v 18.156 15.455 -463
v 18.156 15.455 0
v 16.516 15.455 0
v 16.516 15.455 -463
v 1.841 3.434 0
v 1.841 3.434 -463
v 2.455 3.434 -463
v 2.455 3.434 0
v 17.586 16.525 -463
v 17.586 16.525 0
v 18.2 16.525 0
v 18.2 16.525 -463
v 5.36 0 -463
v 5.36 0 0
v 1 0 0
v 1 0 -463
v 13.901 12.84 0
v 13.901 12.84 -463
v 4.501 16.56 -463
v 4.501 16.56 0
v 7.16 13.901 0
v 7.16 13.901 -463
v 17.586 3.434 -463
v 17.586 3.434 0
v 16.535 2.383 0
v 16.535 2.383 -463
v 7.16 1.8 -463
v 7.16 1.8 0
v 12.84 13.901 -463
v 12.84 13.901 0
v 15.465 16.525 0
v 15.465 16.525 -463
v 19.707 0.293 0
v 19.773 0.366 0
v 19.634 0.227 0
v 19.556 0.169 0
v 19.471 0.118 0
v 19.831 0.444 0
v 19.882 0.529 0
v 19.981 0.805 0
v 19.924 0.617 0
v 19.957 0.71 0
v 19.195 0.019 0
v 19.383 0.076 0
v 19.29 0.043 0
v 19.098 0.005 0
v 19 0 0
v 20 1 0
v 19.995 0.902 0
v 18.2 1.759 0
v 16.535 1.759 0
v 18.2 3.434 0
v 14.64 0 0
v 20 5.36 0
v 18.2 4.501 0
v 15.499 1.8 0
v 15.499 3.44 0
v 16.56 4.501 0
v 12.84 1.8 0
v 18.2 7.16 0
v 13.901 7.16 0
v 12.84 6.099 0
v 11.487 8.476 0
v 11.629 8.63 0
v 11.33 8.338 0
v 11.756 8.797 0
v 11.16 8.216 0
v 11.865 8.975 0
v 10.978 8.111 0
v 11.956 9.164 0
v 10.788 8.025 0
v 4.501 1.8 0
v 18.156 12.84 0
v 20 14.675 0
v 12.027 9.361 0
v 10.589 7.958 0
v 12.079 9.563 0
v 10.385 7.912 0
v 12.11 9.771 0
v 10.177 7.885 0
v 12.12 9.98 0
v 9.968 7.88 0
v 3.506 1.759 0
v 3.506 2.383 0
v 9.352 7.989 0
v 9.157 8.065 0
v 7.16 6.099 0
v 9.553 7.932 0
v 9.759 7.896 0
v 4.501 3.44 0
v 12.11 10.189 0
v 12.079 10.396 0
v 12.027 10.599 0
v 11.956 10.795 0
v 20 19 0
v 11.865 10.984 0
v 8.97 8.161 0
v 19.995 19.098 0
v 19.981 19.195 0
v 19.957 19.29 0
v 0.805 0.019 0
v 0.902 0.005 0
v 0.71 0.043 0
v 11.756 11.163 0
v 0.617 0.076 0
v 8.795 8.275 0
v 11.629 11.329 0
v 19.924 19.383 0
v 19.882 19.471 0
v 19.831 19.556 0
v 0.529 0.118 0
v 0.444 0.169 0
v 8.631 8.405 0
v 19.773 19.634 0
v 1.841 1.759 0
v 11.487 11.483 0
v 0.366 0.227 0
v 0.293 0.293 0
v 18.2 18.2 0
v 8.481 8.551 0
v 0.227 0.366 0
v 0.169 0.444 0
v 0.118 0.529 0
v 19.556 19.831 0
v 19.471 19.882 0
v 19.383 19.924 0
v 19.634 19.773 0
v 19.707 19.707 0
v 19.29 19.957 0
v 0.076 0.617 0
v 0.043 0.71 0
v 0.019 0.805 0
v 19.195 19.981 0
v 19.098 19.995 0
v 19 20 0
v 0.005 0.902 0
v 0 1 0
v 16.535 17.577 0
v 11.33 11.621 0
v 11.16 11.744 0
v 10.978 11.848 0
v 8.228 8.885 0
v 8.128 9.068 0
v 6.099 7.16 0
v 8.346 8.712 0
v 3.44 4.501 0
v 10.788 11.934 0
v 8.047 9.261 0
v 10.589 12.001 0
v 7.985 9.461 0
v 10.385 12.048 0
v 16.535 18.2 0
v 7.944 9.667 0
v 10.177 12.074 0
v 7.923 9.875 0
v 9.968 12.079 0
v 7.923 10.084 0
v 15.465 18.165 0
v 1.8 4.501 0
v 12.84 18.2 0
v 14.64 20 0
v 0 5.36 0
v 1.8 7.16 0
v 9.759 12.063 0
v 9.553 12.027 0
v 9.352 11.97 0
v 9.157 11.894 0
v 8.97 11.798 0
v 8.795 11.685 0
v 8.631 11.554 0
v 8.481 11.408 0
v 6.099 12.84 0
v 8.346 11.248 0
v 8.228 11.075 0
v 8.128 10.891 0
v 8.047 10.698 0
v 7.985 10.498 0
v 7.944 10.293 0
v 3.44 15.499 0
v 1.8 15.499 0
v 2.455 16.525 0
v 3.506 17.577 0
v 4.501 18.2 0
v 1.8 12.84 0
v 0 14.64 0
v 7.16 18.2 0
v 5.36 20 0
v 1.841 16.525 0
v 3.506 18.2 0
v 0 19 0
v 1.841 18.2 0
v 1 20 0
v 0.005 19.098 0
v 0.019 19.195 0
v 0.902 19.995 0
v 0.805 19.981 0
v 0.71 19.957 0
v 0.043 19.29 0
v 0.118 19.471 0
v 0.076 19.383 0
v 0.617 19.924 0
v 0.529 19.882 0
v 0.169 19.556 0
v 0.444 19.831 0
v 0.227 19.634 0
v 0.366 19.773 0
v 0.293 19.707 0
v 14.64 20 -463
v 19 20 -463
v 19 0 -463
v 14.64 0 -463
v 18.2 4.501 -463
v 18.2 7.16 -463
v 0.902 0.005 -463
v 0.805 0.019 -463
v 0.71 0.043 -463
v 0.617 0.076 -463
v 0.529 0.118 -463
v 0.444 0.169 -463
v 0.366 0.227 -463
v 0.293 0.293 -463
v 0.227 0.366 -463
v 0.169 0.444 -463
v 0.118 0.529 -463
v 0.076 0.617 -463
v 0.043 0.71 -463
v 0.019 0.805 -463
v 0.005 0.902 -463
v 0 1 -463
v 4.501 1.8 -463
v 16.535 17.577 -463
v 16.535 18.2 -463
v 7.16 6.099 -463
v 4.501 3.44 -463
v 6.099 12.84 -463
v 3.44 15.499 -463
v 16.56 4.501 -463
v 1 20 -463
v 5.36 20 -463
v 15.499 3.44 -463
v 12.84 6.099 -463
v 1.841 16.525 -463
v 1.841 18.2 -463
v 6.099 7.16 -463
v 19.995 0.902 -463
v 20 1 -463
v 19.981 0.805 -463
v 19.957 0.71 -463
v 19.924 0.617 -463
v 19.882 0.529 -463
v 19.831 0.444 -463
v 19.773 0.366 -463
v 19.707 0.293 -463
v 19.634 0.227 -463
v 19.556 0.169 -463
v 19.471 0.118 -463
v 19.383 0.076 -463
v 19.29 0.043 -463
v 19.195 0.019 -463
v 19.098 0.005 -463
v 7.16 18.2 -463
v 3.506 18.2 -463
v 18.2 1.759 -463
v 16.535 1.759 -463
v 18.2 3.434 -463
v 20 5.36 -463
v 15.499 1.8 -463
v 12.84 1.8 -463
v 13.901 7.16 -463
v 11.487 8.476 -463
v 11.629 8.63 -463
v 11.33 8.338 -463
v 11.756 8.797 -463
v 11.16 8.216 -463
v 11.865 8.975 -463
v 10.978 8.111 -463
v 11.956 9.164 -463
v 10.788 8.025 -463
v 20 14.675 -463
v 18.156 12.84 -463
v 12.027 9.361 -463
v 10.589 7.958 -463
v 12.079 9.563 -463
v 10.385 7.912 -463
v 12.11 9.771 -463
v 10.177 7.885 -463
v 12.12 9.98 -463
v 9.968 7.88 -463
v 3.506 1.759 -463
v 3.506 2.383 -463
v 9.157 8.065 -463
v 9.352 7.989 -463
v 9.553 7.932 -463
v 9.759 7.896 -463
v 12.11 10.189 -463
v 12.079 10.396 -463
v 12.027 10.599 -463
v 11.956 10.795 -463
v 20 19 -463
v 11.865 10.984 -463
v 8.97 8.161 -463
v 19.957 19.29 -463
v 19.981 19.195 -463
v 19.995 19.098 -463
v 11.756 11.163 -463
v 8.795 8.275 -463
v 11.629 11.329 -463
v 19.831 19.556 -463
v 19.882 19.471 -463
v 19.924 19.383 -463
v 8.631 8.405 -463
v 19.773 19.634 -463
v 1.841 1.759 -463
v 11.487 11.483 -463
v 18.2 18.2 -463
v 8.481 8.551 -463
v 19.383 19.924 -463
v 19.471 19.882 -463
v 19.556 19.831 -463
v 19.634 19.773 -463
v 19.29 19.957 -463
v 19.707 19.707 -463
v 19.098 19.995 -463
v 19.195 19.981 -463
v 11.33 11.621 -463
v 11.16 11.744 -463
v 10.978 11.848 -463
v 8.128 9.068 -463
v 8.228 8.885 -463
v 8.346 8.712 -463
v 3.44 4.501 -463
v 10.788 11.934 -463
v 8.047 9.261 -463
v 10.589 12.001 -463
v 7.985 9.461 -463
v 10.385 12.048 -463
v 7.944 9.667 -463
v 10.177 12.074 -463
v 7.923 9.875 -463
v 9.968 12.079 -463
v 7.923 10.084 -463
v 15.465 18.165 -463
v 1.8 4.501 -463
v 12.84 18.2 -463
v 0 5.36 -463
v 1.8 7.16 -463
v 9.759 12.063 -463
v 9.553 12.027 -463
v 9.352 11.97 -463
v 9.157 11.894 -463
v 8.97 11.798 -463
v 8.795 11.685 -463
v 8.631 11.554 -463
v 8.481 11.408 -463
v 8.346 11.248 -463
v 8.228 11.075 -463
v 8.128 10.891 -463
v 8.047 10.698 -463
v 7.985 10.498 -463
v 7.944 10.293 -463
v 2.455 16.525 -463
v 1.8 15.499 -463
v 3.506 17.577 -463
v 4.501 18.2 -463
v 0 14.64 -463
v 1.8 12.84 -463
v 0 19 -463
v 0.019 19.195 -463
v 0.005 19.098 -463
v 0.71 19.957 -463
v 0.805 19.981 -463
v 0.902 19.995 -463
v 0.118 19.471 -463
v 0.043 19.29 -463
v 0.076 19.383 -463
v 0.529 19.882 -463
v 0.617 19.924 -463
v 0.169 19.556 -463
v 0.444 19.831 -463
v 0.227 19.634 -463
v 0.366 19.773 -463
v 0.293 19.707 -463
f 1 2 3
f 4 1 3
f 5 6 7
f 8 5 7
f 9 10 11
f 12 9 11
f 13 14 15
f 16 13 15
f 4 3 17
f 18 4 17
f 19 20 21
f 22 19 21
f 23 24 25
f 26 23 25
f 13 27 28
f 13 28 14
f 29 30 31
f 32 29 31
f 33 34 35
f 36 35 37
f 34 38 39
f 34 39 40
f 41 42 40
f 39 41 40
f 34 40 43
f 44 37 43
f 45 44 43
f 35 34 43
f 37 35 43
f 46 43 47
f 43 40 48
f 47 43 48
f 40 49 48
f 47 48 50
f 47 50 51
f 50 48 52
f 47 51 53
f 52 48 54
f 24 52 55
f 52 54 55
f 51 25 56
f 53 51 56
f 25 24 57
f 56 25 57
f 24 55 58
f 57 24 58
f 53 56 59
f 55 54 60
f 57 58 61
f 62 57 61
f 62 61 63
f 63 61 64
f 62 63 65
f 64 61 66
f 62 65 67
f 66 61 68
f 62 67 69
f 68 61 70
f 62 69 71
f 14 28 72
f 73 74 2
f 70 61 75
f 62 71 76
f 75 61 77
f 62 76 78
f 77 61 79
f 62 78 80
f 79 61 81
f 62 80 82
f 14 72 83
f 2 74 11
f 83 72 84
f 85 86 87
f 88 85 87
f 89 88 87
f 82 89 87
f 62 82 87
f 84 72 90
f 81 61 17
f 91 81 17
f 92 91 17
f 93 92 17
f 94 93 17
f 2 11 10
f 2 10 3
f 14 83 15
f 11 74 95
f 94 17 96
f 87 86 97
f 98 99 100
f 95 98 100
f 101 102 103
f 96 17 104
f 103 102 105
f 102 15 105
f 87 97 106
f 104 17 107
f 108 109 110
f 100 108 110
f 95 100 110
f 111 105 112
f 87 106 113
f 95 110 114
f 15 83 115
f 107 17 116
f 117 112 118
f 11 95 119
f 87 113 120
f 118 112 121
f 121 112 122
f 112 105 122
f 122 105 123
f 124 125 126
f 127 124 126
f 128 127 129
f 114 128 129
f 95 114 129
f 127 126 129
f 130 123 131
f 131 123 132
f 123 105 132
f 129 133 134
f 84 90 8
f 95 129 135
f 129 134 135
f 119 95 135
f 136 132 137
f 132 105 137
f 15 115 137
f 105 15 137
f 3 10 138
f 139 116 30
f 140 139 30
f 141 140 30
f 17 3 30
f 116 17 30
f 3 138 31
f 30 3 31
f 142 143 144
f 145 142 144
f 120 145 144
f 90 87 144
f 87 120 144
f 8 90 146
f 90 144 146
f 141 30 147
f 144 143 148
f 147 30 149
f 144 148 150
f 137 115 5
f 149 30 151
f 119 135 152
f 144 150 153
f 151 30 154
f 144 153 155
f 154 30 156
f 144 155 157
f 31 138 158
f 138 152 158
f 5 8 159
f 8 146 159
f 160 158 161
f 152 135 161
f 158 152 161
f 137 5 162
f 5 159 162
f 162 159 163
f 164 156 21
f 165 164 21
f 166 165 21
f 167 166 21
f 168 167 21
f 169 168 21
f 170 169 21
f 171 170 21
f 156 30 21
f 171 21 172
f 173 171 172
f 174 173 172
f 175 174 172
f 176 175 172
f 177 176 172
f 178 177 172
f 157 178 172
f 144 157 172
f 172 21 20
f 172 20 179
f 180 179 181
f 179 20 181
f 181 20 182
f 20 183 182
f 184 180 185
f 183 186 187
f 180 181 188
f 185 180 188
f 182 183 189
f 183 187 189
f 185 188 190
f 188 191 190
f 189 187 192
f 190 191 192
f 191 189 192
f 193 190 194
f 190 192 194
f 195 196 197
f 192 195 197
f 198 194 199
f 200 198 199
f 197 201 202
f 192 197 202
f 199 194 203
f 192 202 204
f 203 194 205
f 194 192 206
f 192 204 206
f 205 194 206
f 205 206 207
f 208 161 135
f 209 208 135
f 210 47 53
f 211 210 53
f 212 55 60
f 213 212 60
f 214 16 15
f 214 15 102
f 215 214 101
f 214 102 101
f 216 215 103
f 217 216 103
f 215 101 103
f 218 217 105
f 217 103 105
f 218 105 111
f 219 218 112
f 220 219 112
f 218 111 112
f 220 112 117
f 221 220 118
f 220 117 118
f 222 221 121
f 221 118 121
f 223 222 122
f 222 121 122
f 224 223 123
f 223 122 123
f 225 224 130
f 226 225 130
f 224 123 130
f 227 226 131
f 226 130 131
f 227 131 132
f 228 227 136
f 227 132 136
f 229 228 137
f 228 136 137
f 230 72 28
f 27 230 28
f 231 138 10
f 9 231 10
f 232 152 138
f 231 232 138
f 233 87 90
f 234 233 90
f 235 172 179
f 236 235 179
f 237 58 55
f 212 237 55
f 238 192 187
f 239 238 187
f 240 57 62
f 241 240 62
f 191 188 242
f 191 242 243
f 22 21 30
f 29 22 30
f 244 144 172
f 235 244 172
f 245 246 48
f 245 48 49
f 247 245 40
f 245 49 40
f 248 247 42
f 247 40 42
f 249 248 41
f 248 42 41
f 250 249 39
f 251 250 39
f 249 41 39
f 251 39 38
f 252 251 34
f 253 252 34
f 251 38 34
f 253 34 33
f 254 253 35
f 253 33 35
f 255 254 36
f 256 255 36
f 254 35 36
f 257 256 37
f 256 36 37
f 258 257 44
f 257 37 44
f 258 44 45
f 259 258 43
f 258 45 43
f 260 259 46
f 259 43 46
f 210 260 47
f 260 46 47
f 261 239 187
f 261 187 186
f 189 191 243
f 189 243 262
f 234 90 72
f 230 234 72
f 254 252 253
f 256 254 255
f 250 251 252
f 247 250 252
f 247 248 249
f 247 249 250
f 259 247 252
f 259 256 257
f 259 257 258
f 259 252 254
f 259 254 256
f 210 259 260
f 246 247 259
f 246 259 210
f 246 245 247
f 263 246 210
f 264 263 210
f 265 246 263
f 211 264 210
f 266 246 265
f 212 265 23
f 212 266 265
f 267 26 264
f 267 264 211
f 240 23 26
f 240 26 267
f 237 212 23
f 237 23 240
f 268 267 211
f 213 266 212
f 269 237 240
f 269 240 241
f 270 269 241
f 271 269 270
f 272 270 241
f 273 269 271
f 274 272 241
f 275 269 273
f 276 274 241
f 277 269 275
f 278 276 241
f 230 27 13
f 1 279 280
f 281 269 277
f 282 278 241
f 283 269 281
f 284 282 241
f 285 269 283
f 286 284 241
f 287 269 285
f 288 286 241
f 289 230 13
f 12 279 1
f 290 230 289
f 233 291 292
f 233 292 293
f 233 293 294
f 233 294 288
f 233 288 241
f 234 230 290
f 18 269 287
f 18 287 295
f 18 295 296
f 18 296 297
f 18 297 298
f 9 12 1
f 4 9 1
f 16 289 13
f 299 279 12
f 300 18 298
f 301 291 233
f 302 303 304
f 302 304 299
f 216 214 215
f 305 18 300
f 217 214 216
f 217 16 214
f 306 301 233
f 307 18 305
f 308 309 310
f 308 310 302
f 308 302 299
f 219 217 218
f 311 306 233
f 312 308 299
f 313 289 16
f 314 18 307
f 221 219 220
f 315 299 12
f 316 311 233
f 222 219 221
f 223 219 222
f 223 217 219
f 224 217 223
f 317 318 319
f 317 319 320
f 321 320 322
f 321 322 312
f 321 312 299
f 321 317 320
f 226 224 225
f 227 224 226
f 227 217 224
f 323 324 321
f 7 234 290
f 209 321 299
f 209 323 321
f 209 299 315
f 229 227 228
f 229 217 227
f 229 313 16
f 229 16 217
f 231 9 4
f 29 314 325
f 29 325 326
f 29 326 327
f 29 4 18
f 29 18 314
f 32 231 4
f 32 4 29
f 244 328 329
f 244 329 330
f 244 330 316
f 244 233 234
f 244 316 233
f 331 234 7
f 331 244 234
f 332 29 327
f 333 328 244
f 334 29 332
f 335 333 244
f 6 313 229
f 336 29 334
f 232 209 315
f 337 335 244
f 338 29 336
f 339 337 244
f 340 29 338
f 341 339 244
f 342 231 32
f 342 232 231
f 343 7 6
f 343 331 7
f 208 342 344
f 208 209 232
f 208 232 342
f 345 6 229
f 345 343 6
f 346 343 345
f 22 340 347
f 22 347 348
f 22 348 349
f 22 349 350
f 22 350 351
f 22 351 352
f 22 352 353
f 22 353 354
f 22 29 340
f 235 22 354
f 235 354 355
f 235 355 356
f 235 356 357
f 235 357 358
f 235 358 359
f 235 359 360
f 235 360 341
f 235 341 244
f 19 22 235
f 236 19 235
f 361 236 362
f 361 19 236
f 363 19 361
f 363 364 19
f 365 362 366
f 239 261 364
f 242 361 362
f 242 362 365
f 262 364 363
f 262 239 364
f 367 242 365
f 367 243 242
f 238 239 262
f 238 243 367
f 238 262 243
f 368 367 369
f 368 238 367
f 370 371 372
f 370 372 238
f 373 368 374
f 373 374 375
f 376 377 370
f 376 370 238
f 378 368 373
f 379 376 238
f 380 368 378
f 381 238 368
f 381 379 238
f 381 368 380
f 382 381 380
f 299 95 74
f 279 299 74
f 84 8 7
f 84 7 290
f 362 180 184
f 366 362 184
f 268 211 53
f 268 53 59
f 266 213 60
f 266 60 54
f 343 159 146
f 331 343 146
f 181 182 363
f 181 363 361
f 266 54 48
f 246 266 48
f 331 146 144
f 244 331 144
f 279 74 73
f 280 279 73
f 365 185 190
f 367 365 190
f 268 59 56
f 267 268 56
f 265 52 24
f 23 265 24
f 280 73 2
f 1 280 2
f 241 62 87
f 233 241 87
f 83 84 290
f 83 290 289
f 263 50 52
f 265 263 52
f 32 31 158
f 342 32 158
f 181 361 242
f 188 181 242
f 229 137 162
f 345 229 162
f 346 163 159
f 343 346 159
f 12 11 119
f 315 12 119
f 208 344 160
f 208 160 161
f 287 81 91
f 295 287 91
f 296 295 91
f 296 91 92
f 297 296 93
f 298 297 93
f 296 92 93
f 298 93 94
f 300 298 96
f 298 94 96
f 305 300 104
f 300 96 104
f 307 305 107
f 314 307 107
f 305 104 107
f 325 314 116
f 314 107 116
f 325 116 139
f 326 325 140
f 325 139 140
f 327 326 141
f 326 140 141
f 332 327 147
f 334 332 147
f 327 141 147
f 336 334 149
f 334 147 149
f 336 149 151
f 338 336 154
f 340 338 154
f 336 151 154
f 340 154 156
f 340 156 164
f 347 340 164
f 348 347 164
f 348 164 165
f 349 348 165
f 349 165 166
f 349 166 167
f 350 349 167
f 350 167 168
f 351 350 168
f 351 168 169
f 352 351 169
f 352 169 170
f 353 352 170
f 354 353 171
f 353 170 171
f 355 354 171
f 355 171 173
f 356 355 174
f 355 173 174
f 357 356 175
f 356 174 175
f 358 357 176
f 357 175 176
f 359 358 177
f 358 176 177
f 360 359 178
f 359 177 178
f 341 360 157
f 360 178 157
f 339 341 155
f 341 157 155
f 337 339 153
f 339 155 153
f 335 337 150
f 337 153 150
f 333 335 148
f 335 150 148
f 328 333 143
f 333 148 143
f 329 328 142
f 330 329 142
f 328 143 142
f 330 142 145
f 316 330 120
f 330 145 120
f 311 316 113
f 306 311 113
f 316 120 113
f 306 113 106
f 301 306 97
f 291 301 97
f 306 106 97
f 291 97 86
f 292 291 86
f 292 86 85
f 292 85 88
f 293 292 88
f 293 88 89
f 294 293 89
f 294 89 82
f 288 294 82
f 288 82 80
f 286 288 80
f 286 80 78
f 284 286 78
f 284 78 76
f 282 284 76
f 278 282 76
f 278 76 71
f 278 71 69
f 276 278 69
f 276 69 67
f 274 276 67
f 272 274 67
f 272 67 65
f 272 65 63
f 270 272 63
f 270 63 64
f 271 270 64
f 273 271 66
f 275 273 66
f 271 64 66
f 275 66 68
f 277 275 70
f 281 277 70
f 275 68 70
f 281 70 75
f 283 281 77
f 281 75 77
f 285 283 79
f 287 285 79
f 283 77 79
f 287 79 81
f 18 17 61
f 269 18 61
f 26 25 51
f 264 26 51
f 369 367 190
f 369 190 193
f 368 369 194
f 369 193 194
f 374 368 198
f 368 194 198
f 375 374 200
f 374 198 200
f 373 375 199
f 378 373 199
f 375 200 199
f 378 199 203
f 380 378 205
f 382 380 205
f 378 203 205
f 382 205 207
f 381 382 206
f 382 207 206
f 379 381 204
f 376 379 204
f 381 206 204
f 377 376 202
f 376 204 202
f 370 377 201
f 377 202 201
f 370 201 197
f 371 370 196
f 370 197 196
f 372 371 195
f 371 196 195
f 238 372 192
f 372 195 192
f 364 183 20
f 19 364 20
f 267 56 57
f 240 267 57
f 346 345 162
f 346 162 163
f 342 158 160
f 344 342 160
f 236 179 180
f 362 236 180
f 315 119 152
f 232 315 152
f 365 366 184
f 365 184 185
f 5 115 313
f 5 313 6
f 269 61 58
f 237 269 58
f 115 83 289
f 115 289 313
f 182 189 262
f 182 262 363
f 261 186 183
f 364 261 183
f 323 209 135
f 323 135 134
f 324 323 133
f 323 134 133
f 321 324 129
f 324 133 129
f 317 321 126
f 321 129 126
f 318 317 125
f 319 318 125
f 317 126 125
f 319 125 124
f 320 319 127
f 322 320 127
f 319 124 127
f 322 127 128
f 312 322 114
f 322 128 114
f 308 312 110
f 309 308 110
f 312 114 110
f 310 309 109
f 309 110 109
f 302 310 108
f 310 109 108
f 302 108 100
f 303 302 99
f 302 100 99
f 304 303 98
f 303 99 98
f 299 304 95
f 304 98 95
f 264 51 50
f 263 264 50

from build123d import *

# Parameters (mm, degrees)
SKETCH1_R           = 2.1
BOSS_EXTRUDE1_DEPTH = 463


with BuildPart() as part:
    # Sketch1 → Boss-Extrude1 (new body)
    with BuildSketch(Plane.XY):
        with BuildLine():
            Line((0, 1), (0, 5.36))
            Line((0, 5.36), (1.8, 7.16))
            Line((1.8, 7.16), (1.8, 4.500660172))
            Line((1.8, 4.500660172), (3.44, 4.500660172))
            Line((3.44, 4.500660172), (6.099339828, 7.16))
            Line((6.099339828, 7.16), (6.099339828, 12.84))
            Line((6.099339828, 12.84), (3.44, 15.499339828))
            Line((3.44, 15.499339828), (1.8, 15.499339828))
            Line((1.8, 15.499339828), (1.8, 12.84))
            Line((1.8, 12.84), (0, 14.64))
            Line((0, 14.64), (0, 19))
            ThreePointArc((0, 19), (0.292893219, 19.707106781), (1, 20))
            Line((1, 20), (5.36, 20))
            Line((5.36, 20), (7.16, 18.2))
            Line((7.16, 18.2), (4.500660172, 18.2))
            Line((4.500660172, 18.2), (4.500660172, 16.56))
            Line((4.500660172, 16.56), (7.16, 13.900660172))
            Line((7.16, 13.900660172), (12.84, 13.900660172))
            Line((12.84, 13.900660172), (15.464579042, 16.525239214))
            Line((15.464579042, 16.525239214), (15.464579042, 18.165239214))
            Line((15.464579042, 18.165239214), (12.84, 18.2))
            Line((12.84, 18.2), (14.64, 20))
            Line((14.64, 20), (19, 20))
            ThreePointArc((19, 20), (19.707106781, 19.707106781), (20, 19))
            Line((20, 19), (20, 14.674581351))
            Line((20, 14.674581351), (18.155899385, 12.84))
            Line((18.155899385, 12.84), (18.155899385, 15.455239214))
            Line((18.155899385, 15.455239214), (16.515899385, 15.455239214))
            Line((16.515899385, 15.455239214), (13.900660172, 12.84))
            Line((13.900660172, 12.84), (13.900660172, 7.16))
            Line((13.900660172, 7.16), (16.56, 4.500660172))
            Line((16.56, 4.500660172), (18.2, 4.500660172))
            Line((18.2, 4.500660172), (18.2, 7.16))
            Line((18.2, 7.16), (20, 5.36))
            Line((20, 5.36), (20, 1))
            ThreePointArc((20, 1), (19.707106781, 0.292893219), (19, 0))
            Line((19, 0), (14.64, 0))
            Line((14.64, 0), (12.84, 1.8))
            Line((12.84, 1.8), (15.499339828, 1.8))
            Line((15.499339828, 1.8), (15.499339828, 3.44))
            Line((15.499339828, 3.44), (12.84, 6.099339828))
            Line((12.84, 6.099339828), (7.16, 6.099339828))
            Line((7.16, 6.099339828), (4.500660172, 3.44))
            Line((4.500660172, 3.44), (4.500660172, 1.8))
            Line((4.500660172, 1.8), (7.16, 1.8))
            Line((7.16, 1.8), (5.36, 0))
            Line((5.36, 0), (1, 0))
            ThreePointArc((1, 0), (0.292893219, 0.292893219), (0, 1))
        make_face()
        with Locations((10.02040103, 9.97959897)):
            Circle(SKETCH1_R, mode=Mode.SUBTRACT)
        Polygon((16.534579042, 18.2), (16.534579042, 17.576559557), (17.585899385, 16.525239214), (18.2, 16.525239214), (18.2, 18.2), align=None, mode=Mode.SUBTRACT)
        Polygon((18.2, 1.75919794), (18.2, 3.433958726), (17.585899385, 3.433958726), (16.534579042, 2.382638382), (16.534579042, 1.75919794), align=None, mode=Mode.SUBTRACT)
        Polygon((2.454902675, 16.525239214), (1.84080206, 16.525239214), (1.84080206, 18.2), (3.506223018, 18.2), (3.506223018, 17.576559557), align=None, mode=Mode.SUBTRACT)
        Polygon((3.506223018, 1.75919794), (1.84080206, 1.75919794), (1.84080206, 3.433958726), (2.454902675, 3.433958726), (3.506223018, 2.382638382), align=None, mode=Mode.SUBTRACT)
    extrude(amount=-BOSS_EXTRUDE1_DEPTH)


solid = part.part
